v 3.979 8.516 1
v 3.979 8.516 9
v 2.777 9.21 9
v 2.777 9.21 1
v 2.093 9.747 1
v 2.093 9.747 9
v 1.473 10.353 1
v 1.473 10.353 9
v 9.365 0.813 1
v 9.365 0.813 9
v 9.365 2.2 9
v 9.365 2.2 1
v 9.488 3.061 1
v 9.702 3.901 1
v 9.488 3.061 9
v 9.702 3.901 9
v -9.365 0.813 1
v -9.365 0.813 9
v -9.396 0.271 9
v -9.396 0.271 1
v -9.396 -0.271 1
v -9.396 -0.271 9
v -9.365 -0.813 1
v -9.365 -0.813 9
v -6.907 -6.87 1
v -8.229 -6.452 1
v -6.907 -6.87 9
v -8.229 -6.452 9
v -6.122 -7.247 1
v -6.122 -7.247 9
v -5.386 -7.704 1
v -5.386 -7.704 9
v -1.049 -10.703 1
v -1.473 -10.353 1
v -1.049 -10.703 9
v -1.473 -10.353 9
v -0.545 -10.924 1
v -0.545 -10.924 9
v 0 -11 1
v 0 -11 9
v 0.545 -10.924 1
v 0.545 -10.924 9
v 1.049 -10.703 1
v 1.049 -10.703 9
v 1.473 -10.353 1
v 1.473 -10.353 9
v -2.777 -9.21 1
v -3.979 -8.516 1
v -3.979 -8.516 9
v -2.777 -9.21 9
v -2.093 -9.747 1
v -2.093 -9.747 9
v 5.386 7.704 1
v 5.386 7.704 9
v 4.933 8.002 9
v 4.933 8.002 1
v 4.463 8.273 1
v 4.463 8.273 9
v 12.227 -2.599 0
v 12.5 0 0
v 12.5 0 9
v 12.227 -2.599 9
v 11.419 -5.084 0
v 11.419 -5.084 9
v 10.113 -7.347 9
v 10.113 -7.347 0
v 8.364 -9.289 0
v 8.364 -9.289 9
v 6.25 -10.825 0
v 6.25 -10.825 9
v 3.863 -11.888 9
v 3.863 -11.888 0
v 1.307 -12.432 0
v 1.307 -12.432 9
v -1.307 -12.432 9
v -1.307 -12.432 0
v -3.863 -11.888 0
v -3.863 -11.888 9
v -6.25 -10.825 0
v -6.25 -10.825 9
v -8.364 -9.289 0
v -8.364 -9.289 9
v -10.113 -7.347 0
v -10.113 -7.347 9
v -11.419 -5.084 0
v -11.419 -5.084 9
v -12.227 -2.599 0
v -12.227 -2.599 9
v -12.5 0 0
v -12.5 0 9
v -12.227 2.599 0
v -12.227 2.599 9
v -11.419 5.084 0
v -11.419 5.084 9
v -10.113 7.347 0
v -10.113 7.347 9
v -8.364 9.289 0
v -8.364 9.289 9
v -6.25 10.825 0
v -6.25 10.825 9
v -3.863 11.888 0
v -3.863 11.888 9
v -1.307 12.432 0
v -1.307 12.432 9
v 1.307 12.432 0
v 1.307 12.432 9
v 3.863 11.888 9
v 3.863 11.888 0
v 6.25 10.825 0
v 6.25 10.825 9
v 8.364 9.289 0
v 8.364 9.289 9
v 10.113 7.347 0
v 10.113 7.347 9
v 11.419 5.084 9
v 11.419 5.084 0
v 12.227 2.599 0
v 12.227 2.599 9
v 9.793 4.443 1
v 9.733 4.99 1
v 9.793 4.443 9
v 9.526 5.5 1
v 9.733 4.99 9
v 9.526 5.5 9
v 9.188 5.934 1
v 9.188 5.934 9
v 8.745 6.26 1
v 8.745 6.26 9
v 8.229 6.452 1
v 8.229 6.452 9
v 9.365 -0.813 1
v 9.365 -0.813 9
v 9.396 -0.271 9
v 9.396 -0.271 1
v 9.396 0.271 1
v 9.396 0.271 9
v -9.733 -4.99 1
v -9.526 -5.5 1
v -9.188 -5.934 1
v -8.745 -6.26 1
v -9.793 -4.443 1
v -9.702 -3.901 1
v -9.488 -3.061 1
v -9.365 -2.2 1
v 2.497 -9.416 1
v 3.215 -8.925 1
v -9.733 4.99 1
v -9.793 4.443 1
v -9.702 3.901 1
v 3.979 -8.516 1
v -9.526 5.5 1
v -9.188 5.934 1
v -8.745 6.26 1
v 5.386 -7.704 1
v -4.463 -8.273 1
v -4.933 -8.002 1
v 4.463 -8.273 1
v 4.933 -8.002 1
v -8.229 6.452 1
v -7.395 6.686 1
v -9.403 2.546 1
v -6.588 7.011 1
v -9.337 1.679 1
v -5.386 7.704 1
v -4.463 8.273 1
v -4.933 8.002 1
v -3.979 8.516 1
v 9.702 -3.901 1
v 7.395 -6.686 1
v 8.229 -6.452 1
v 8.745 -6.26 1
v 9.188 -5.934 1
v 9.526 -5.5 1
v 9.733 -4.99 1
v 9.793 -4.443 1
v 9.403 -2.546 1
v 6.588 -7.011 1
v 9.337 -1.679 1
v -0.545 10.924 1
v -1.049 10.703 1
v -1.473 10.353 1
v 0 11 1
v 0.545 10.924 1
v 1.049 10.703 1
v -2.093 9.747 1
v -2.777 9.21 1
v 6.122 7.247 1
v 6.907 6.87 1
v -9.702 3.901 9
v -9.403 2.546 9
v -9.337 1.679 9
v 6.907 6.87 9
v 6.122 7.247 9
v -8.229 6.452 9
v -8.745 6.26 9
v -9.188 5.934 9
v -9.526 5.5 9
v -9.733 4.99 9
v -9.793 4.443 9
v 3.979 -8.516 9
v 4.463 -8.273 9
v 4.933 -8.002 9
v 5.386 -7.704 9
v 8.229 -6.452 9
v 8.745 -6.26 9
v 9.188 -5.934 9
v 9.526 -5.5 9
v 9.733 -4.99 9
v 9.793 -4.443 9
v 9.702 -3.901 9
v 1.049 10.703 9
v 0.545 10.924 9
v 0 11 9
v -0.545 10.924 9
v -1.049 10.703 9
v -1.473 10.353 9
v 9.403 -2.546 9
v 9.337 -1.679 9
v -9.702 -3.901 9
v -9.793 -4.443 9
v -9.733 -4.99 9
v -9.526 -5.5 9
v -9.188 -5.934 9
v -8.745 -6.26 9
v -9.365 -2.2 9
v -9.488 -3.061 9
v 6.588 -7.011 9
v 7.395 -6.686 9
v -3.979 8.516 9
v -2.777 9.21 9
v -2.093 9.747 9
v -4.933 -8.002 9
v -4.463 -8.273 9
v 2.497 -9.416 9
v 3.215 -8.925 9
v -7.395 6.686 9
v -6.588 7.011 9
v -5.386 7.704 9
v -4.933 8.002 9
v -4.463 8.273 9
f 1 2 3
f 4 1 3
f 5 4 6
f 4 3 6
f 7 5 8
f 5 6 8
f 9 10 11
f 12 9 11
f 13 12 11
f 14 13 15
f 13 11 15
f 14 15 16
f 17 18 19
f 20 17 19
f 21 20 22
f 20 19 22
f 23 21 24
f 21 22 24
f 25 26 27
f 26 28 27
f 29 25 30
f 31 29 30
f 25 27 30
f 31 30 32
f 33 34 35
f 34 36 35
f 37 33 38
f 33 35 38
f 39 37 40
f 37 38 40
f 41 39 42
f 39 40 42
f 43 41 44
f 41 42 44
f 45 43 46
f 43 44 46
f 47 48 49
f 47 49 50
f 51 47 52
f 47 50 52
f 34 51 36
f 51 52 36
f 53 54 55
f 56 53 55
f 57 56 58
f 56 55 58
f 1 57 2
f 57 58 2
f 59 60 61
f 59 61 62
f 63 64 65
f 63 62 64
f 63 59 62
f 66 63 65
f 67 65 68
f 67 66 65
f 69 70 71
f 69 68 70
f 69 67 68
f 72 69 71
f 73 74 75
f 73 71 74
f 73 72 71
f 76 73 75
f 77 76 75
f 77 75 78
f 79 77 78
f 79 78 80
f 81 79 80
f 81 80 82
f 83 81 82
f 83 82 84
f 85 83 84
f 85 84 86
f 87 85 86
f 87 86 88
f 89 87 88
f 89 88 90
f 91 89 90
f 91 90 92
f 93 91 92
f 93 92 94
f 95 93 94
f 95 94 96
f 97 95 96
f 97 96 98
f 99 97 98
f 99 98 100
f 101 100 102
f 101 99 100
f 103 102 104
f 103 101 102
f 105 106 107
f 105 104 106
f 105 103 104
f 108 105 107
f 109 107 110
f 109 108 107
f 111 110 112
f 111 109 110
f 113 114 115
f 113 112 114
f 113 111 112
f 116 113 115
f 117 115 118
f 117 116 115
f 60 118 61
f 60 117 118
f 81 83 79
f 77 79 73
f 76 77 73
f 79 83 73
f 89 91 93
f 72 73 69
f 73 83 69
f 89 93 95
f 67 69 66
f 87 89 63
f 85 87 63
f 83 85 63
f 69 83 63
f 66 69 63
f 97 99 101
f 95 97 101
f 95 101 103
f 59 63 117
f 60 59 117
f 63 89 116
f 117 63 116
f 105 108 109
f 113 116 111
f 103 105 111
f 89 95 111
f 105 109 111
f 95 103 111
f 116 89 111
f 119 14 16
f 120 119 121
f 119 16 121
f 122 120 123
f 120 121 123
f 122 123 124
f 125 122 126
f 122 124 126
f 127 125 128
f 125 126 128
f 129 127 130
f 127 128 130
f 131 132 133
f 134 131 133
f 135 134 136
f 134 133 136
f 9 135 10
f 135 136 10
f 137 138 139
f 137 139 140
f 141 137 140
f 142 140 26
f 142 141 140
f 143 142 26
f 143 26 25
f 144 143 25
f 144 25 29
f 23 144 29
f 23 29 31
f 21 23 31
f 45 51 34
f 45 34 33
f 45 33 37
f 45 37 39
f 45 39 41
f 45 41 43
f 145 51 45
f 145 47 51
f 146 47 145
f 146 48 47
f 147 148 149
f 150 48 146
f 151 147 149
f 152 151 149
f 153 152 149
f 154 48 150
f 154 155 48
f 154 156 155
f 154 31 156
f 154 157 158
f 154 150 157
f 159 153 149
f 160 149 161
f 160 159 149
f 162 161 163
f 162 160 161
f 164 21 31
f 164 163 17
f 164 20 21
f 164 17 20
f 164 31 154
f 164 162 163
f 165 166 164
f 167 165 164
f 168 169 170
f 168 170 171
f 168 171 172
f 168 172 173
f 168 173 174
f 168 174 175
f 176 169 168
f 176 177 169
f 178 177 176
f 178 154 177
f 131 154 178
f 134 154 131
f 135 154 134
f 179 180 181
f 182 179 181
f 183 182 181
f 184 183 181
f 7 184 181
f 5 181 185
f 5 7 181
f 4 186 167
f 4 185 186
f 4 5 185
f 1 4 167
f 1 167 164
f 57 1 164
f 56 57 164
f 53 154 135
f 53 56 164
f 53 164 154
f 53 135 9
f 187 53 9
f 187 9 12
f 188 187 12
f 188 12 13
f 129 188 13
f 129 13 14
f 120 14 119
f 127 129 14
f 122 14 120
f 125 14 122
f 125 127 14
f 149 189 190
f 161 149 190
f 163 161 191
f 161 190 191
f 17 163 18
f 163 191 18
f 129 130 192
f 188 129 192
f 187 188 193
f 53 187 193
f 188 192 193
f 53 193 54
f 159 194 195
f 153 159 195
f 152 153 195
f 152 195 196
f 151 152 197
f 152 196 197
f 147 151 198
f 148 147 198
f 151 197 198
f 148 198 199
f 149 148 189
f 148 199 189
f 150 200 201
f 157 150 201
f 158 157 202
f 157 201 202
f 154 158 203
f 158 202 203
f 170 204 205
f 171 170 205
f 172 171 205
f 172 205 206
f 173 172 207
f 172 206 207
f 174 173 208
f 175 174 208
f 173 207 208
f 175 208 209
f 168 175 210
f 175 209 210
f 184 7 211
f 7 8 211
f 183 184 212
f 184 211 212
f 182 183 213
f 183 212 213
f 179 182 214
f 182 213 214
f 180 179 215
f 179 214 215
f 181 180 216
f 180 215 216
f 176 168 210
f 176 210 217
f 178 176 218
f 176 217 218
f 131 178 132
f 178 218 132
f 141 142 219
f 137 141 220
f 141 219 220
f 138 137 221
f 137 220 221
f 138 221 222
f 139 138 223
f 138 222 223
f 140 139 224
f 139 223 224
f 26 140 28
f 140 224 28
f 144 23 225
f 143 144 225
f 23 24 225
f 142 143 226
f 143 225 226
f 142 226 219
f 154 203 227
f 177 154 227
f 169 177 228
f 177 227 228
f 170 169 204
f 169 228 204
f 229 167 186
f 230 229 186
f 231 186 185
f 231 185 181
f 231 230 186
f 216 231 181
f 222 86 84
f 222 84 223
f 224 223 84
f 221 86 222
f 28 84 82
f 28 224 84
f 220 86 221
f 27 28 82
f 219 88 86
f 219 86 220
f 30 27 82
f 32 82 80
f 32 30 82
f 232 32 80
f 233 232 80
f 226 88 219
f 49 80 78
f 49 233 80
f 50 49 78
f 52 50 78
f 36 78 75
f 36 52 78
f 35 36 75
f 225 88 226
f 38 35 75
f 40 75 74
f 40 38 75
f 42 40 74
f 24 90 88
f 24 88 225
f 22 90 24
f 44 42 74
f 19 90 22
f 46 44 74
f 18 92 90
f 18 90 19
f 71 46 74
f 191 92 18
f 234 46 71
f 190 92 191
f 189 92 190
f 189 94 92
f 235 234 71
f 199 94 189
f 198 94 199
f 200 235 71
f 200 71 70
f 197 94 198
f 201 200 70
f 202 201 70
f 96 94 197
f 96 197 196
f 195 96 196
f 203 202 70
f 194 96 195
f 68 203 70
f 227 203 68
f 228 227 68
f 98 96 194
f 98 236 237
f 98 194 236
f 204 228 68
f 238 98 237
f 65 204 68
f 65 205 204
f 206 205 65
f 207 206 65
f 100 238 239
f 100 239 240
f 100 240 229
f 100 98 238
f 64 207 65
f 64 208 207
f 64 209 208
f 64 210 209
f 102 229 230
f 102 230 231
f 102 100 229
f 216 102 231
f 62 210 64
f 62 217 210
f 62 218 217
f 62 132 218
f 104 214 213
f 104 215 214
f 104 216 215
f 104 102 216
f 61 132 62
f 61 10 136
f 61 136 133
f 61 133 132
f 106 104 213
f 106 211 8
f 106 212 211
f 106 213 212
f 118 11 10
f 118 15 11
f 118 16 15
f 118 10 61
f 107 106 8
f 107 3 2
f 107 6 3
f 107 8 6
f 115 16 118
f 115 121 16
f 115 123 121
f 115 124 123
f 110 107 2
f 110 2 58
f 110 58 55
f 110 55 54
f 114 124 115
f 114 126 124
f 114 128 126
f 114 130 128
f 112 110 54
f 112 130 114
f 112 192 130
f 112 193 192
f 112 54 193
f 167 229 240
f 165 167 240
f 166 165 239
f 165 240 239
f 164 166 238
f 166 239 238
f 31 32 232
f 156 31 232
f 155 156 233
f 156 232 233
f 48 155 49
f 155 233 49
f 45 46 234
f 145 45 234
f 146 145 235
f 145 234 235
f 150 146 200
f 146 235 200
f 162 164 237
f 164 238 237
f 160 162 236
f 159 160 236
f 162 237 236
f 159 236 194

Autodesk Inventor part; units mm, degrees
ref_plane "YZ Plane" through (0, 0, 0) normal (1, 0, 0) x (0, 1, 0)
ref_plane "XZ Plane" through (0, 0, 0) normal (0, 1, 0) x (-1, 0, 0)
ref_plane "XY Plane" through (0, 0, 0) normal (0, 0, 1) x (1, 0, 0)
sketch "Sketch6" plane through (0, 0, 0) normal (0, 0, 1) x (1, 0, 0)
  circle A0 centre (0, 0) radius 12.5
  dimension "d29" = 25
extrude "base" add sketch "Sketch6" along normal blind 9
sketch "Sketch8" plane through (0, 0, 9) normal (0, 0, 1) x (1, 0, 0)
  circle A0 centre (0, 0) radius 9.4
  dimension "d39" = 18.8
extrude "Extrusion8" cut sketch "Sketch8" against normal blind 8
sketch "Sketch7" plane through (0, 0, 9) normal (0, 0, 1) x (1, 0, 0)
  line L0 (0, 0) -> (0, 9)
  circle A0 centre (0, 9) radius 2
  dimension "d33" = 9
  dimension "d34" = 4
extrude "ball_place" cut sketch "Sketch7" against normal blind 8
fillet "Fillet5" radius 8 2 edges at (-1.9913, 9.1867, 5) (1.9913, 9.1867, 5)
pattern_circular "Circular Pattern2" count 6 over 360 about axis through (0, 0, 9) along (0, 0, -1) of "ball_place", "Fillet5"
equation "\"BendRadius\" = Thickness"
equation "\"BendReliefWidth\" = Thickness"
equation "\"BendReliefDepth\" = 0.5 * Thickness"
equation "\"CornerReliefSize\" = 4 * Thickness"
equation "\"MinimumRemnant\" = 2 * Thickness"
equation "\"TransitionRadius\" = BendRadius"
equation "\"JacobiRadiusSize\" = BendRadius"
equation "\"GapSize\" = Thickness"
equation "\"Thickness\" = 0.5"
properties part number "embrague_1"
